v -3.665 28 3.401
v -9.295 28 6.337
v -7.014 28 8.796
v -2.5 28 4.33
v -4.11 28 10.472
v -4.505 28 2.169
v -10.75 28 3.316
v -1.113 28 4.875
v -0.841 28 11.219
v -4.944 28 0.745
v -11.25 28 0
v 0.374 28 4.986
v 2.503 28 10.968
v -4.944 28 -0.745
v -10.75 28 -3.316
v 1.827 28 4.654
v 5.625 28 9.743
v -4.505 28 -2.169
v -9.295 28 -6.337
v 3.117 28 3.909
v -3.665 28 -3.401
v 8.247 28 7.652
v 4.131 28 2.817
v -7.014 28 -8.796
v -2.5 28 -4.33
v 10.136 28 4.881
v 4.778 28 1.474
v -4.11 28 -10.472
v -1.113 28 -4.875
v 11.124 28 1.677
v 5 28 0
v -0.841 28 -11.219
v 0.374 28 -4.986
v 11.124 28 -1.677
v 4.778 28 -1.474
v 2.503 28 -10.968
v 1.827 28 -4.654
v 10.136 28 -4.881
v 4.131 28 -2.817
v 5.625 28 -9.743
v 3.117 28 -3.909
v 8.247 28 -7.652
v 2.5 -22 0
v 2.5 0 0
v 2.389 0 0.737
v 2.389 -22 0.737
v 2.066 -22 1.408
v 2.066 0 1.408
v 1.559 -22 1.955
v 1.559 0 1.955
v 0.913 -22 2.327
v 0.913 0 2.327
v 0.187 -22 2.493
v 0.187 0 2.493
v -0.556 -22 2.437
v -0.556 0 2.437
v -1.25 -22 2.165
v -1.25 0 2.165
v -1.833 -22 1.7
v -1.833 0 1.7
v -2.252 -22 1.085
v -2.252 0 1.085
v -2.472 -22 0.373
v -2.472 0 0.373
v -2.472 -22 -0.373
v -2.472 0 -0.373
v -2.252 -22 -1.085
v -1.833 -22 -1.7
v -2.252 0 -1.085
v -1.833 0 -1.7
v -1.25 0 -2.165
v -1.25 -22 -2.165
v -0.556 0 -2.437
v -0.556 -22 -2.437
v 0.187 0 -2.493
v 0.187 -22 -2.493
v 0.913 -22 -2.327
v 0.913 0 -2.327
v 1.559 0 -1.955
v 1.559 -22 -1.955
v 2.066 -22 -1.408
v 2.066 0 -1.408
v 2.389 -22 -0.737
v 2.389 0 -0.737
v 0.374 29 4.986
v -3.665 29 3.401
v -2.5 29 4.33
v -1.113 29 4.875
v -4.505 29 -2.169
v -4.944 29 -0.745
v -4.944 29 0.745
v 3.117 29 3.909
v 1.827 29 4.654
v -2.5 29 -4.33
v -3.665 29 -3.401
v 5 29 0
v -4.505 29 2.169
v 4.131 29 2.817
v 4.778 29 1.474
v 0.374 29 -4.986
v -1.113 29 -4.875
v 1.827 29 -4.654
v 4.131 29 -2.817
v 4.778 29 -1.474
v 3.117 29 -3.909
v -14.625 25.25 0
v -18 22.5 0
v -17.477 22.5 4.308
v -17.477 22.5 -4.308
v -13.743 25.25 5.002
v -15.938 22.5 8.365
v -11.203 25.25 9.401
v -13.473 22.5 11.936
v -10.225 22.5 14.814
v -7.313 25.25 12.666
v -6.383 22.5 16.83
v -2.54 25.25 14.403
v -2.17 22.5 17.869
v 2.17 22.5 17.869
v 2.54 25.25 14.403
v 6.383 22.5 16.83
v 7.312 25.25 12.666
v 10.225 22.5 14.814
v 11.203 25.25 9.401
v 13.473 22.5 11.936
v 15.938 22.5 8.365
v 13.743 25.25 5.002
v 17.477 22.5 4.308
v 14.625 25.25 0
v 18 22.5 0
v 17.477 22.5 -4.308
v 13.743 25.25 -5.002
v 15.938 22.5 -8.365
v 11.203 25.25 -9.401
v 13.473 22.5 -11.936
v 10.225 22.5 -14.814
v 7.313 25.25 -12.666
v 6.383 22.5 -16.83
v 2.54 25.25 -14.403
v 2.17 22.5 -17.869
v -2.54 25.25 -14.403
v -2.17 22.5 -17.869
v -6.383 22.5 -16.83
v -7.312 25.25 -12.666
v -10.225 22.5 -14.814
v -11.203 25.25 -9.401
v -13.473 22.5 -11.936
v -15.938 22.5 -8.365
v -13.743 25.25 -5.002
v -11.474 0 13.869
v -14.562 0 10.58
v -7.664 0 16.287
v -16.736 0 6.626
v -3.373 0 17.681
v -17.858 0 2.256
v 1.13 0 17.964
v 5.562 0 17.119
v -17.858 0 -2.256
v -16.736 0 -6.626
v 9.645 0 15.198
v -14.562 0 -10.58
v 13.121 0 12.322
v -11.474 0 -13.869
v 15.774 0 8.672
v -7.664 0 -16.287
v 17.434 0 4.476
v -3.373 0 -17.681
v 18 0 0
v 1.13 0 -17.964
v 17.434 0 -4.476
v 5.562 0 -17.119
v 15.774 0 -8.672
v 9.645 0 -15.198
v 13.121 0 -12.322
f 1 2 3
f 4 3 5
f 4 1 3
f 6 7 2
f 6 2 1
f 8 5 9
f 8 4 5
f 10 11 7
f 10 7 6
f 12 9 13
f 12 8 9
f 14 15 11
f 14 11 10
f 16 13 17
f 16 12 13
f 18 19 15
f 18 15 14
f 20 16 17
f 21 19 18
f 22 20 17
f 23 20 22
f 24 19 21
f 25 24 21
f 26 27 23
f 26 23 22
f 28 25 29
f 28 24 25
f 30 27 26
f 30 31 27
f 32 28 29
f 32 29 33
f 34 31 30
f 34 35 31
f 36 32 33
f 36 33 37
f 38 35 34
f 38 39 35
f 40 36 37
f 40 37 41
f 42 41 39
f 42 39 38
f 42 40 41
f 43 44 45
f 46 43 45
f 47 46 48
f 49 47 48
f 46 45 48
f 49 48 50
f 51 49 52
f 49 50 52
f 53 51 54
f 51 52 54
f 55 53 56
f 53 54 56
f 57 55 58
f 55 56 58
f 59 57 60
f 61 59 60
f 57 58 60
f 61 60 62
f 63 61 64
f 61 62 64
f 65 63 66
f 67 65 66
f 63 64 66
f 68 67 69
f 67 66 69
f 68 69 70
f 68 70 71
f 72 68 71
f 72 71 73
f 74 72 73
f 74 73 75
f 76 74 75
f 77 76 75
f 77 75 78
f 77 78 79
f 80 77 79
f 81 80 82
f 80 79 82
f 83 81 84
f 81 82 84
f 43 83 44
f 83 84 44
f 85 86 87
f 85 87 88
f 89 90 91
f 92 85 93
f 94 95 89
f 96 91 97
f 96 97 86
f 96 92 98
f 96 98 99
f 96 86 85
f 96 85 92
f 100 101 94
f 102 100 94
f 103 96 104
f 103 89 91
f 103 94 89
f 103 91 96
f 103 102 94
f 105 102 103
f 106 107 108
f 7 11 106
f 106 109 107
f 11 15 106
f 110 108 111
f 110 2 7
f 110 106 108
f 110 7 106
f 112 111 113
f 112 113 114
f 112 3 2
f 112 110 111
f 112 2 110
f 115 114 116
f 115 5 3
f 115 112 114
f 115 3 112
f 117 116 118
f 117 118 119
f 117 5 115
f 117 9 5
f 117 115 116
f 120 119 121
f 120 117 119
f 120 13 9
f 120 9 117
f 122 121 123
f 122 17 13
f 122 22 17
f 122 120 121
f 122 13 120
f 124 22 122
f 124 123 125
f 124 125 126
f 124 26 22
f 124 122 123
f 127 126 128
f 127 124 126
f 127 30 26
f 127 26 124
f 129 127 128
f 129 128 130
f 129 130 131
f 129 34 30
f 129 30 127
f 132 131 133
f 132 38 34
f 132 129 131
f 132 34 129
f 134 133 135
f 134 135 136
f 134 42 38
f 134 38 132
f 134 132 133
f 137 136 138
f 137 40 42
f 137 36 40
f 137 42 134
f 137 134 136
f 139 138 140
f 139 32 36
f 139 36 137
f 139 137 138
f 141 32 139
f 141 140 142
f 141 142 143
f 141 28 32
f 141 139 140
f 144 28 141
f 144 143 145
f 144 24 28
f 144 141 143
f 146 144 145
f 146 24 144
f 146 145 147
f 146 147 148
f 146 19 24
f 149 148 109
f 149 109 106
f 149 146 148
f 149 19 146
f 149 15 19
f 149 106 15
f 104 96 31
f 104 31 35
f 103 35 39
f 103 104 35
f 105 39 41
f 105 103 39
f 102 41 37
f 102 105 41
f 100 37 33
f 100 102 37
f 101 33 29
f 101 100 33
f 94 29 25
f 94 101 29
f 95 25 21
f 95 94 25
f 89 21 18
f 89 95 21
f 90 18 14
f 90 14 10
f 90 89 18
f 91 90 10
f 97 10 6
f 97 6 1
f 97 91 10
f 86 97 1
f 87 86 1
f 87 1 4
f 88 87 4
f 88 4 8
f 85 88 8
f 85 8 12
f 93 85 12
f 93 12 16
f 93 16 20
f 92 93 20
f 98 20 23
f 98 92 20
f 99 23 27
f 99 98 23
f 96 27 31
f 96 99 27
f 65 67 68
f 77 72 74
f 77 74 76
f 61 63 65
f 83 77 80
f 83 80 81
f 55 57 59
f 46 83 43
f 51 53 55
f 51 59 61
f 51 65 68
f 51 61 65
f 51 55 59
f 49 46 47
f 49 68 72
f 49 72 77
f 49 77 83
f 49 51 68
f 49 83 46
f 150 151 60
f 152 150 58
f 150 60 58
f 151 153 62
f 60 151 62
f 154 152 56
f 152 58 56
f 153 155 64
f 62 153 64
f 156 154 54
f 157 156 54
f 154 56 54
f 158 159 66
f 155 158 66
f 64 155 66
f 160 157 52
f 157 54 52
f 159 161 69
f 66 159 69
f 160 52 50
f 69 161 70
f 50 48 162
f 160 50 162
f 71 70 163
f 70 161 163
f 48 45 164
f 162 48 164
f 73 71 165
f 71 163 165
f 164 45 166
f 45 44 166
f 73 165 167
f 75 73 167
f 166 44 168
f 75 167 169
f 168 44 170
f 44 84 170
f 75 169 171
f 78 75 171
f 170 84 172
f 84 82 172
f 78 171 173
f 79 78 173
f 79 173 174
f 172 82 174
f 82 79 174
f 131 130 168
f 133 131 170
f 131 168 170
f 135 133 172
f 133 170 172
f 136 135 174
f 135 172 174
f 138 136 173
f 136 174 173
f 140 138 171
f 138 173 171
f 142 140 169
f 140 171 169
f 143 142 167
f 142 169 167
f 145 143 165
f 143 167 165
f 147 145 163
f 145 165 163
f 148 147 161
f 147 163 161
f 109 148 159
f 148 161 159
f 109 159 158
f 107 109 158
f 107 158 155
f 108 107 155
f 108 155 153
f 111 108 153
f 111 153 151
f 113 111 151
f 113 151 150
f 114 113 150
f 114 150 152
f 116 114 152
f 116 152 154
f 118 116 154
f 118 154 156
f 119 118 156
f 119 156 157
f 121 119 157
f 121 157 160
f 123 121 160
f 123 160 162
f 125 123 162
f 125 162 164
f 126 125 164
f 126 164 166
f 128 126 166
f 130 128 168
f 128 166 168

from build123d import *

# Parameters (mm, degrees)
CROQUIS1_R              = 18
SALIENTE_EXTRUIR1_DEPTH = 29
CROQUIS2_R              = 2.5
SALIENTE_EXTRUIR2_DEPTH = 22
CROQUIS3_R              = 18
CROQUIS3_R_2            = 5
CORTAR_EXTRUIR1_DEPTH   = 1


with BuildPart() as part:
    # Croquis1 → Saliente-Extruir1 (new body)
    with BuildSketch(Plane(origin=(0, 0, 0), x_dir=(1, 0, 0), z_dir=(0, 1, 0))):
        Circle(CROQUIS1_R)
    extrude(amount=SALIENTE_EXTRUIR1_DEPTH)

    # Croquis2 → Saliente-Extruir2 (add)
    with BuildSketch(Plane.XZ):
        Circle(CROQUIS2_R)
    extrude(amount=SALIENTE_EXTRUIR2_DEPTH)

    # Croquis3 → Cortar-Extruir1 (cut)
    with BuildSketch(Plane(origin=(0, 29, 0), x_dir=(1, 0, 0), z_dir=(0, 1, 0))):
        Circle(CROQUIS3_R)
        Circle(CROQUIS3_R_2, mode=Mode.SUBTRACT)
    extrude(amount=-CORTAR_EXTRUIR1_DEPTH, mode=Mode.SUBTRACT)

    # Croquis4 → Cortar-Revolución1 (revolve, cut)
    with BuildSketch(Plane.XY):
        Polygon((-18, 22.5), (-11.25, 28), (-18, 28), align=None)
    revolve(axis=Axis((0, 0, 0), (0, 1, 0)), mode=Mode.SUBTRACT)


solid = part.part
